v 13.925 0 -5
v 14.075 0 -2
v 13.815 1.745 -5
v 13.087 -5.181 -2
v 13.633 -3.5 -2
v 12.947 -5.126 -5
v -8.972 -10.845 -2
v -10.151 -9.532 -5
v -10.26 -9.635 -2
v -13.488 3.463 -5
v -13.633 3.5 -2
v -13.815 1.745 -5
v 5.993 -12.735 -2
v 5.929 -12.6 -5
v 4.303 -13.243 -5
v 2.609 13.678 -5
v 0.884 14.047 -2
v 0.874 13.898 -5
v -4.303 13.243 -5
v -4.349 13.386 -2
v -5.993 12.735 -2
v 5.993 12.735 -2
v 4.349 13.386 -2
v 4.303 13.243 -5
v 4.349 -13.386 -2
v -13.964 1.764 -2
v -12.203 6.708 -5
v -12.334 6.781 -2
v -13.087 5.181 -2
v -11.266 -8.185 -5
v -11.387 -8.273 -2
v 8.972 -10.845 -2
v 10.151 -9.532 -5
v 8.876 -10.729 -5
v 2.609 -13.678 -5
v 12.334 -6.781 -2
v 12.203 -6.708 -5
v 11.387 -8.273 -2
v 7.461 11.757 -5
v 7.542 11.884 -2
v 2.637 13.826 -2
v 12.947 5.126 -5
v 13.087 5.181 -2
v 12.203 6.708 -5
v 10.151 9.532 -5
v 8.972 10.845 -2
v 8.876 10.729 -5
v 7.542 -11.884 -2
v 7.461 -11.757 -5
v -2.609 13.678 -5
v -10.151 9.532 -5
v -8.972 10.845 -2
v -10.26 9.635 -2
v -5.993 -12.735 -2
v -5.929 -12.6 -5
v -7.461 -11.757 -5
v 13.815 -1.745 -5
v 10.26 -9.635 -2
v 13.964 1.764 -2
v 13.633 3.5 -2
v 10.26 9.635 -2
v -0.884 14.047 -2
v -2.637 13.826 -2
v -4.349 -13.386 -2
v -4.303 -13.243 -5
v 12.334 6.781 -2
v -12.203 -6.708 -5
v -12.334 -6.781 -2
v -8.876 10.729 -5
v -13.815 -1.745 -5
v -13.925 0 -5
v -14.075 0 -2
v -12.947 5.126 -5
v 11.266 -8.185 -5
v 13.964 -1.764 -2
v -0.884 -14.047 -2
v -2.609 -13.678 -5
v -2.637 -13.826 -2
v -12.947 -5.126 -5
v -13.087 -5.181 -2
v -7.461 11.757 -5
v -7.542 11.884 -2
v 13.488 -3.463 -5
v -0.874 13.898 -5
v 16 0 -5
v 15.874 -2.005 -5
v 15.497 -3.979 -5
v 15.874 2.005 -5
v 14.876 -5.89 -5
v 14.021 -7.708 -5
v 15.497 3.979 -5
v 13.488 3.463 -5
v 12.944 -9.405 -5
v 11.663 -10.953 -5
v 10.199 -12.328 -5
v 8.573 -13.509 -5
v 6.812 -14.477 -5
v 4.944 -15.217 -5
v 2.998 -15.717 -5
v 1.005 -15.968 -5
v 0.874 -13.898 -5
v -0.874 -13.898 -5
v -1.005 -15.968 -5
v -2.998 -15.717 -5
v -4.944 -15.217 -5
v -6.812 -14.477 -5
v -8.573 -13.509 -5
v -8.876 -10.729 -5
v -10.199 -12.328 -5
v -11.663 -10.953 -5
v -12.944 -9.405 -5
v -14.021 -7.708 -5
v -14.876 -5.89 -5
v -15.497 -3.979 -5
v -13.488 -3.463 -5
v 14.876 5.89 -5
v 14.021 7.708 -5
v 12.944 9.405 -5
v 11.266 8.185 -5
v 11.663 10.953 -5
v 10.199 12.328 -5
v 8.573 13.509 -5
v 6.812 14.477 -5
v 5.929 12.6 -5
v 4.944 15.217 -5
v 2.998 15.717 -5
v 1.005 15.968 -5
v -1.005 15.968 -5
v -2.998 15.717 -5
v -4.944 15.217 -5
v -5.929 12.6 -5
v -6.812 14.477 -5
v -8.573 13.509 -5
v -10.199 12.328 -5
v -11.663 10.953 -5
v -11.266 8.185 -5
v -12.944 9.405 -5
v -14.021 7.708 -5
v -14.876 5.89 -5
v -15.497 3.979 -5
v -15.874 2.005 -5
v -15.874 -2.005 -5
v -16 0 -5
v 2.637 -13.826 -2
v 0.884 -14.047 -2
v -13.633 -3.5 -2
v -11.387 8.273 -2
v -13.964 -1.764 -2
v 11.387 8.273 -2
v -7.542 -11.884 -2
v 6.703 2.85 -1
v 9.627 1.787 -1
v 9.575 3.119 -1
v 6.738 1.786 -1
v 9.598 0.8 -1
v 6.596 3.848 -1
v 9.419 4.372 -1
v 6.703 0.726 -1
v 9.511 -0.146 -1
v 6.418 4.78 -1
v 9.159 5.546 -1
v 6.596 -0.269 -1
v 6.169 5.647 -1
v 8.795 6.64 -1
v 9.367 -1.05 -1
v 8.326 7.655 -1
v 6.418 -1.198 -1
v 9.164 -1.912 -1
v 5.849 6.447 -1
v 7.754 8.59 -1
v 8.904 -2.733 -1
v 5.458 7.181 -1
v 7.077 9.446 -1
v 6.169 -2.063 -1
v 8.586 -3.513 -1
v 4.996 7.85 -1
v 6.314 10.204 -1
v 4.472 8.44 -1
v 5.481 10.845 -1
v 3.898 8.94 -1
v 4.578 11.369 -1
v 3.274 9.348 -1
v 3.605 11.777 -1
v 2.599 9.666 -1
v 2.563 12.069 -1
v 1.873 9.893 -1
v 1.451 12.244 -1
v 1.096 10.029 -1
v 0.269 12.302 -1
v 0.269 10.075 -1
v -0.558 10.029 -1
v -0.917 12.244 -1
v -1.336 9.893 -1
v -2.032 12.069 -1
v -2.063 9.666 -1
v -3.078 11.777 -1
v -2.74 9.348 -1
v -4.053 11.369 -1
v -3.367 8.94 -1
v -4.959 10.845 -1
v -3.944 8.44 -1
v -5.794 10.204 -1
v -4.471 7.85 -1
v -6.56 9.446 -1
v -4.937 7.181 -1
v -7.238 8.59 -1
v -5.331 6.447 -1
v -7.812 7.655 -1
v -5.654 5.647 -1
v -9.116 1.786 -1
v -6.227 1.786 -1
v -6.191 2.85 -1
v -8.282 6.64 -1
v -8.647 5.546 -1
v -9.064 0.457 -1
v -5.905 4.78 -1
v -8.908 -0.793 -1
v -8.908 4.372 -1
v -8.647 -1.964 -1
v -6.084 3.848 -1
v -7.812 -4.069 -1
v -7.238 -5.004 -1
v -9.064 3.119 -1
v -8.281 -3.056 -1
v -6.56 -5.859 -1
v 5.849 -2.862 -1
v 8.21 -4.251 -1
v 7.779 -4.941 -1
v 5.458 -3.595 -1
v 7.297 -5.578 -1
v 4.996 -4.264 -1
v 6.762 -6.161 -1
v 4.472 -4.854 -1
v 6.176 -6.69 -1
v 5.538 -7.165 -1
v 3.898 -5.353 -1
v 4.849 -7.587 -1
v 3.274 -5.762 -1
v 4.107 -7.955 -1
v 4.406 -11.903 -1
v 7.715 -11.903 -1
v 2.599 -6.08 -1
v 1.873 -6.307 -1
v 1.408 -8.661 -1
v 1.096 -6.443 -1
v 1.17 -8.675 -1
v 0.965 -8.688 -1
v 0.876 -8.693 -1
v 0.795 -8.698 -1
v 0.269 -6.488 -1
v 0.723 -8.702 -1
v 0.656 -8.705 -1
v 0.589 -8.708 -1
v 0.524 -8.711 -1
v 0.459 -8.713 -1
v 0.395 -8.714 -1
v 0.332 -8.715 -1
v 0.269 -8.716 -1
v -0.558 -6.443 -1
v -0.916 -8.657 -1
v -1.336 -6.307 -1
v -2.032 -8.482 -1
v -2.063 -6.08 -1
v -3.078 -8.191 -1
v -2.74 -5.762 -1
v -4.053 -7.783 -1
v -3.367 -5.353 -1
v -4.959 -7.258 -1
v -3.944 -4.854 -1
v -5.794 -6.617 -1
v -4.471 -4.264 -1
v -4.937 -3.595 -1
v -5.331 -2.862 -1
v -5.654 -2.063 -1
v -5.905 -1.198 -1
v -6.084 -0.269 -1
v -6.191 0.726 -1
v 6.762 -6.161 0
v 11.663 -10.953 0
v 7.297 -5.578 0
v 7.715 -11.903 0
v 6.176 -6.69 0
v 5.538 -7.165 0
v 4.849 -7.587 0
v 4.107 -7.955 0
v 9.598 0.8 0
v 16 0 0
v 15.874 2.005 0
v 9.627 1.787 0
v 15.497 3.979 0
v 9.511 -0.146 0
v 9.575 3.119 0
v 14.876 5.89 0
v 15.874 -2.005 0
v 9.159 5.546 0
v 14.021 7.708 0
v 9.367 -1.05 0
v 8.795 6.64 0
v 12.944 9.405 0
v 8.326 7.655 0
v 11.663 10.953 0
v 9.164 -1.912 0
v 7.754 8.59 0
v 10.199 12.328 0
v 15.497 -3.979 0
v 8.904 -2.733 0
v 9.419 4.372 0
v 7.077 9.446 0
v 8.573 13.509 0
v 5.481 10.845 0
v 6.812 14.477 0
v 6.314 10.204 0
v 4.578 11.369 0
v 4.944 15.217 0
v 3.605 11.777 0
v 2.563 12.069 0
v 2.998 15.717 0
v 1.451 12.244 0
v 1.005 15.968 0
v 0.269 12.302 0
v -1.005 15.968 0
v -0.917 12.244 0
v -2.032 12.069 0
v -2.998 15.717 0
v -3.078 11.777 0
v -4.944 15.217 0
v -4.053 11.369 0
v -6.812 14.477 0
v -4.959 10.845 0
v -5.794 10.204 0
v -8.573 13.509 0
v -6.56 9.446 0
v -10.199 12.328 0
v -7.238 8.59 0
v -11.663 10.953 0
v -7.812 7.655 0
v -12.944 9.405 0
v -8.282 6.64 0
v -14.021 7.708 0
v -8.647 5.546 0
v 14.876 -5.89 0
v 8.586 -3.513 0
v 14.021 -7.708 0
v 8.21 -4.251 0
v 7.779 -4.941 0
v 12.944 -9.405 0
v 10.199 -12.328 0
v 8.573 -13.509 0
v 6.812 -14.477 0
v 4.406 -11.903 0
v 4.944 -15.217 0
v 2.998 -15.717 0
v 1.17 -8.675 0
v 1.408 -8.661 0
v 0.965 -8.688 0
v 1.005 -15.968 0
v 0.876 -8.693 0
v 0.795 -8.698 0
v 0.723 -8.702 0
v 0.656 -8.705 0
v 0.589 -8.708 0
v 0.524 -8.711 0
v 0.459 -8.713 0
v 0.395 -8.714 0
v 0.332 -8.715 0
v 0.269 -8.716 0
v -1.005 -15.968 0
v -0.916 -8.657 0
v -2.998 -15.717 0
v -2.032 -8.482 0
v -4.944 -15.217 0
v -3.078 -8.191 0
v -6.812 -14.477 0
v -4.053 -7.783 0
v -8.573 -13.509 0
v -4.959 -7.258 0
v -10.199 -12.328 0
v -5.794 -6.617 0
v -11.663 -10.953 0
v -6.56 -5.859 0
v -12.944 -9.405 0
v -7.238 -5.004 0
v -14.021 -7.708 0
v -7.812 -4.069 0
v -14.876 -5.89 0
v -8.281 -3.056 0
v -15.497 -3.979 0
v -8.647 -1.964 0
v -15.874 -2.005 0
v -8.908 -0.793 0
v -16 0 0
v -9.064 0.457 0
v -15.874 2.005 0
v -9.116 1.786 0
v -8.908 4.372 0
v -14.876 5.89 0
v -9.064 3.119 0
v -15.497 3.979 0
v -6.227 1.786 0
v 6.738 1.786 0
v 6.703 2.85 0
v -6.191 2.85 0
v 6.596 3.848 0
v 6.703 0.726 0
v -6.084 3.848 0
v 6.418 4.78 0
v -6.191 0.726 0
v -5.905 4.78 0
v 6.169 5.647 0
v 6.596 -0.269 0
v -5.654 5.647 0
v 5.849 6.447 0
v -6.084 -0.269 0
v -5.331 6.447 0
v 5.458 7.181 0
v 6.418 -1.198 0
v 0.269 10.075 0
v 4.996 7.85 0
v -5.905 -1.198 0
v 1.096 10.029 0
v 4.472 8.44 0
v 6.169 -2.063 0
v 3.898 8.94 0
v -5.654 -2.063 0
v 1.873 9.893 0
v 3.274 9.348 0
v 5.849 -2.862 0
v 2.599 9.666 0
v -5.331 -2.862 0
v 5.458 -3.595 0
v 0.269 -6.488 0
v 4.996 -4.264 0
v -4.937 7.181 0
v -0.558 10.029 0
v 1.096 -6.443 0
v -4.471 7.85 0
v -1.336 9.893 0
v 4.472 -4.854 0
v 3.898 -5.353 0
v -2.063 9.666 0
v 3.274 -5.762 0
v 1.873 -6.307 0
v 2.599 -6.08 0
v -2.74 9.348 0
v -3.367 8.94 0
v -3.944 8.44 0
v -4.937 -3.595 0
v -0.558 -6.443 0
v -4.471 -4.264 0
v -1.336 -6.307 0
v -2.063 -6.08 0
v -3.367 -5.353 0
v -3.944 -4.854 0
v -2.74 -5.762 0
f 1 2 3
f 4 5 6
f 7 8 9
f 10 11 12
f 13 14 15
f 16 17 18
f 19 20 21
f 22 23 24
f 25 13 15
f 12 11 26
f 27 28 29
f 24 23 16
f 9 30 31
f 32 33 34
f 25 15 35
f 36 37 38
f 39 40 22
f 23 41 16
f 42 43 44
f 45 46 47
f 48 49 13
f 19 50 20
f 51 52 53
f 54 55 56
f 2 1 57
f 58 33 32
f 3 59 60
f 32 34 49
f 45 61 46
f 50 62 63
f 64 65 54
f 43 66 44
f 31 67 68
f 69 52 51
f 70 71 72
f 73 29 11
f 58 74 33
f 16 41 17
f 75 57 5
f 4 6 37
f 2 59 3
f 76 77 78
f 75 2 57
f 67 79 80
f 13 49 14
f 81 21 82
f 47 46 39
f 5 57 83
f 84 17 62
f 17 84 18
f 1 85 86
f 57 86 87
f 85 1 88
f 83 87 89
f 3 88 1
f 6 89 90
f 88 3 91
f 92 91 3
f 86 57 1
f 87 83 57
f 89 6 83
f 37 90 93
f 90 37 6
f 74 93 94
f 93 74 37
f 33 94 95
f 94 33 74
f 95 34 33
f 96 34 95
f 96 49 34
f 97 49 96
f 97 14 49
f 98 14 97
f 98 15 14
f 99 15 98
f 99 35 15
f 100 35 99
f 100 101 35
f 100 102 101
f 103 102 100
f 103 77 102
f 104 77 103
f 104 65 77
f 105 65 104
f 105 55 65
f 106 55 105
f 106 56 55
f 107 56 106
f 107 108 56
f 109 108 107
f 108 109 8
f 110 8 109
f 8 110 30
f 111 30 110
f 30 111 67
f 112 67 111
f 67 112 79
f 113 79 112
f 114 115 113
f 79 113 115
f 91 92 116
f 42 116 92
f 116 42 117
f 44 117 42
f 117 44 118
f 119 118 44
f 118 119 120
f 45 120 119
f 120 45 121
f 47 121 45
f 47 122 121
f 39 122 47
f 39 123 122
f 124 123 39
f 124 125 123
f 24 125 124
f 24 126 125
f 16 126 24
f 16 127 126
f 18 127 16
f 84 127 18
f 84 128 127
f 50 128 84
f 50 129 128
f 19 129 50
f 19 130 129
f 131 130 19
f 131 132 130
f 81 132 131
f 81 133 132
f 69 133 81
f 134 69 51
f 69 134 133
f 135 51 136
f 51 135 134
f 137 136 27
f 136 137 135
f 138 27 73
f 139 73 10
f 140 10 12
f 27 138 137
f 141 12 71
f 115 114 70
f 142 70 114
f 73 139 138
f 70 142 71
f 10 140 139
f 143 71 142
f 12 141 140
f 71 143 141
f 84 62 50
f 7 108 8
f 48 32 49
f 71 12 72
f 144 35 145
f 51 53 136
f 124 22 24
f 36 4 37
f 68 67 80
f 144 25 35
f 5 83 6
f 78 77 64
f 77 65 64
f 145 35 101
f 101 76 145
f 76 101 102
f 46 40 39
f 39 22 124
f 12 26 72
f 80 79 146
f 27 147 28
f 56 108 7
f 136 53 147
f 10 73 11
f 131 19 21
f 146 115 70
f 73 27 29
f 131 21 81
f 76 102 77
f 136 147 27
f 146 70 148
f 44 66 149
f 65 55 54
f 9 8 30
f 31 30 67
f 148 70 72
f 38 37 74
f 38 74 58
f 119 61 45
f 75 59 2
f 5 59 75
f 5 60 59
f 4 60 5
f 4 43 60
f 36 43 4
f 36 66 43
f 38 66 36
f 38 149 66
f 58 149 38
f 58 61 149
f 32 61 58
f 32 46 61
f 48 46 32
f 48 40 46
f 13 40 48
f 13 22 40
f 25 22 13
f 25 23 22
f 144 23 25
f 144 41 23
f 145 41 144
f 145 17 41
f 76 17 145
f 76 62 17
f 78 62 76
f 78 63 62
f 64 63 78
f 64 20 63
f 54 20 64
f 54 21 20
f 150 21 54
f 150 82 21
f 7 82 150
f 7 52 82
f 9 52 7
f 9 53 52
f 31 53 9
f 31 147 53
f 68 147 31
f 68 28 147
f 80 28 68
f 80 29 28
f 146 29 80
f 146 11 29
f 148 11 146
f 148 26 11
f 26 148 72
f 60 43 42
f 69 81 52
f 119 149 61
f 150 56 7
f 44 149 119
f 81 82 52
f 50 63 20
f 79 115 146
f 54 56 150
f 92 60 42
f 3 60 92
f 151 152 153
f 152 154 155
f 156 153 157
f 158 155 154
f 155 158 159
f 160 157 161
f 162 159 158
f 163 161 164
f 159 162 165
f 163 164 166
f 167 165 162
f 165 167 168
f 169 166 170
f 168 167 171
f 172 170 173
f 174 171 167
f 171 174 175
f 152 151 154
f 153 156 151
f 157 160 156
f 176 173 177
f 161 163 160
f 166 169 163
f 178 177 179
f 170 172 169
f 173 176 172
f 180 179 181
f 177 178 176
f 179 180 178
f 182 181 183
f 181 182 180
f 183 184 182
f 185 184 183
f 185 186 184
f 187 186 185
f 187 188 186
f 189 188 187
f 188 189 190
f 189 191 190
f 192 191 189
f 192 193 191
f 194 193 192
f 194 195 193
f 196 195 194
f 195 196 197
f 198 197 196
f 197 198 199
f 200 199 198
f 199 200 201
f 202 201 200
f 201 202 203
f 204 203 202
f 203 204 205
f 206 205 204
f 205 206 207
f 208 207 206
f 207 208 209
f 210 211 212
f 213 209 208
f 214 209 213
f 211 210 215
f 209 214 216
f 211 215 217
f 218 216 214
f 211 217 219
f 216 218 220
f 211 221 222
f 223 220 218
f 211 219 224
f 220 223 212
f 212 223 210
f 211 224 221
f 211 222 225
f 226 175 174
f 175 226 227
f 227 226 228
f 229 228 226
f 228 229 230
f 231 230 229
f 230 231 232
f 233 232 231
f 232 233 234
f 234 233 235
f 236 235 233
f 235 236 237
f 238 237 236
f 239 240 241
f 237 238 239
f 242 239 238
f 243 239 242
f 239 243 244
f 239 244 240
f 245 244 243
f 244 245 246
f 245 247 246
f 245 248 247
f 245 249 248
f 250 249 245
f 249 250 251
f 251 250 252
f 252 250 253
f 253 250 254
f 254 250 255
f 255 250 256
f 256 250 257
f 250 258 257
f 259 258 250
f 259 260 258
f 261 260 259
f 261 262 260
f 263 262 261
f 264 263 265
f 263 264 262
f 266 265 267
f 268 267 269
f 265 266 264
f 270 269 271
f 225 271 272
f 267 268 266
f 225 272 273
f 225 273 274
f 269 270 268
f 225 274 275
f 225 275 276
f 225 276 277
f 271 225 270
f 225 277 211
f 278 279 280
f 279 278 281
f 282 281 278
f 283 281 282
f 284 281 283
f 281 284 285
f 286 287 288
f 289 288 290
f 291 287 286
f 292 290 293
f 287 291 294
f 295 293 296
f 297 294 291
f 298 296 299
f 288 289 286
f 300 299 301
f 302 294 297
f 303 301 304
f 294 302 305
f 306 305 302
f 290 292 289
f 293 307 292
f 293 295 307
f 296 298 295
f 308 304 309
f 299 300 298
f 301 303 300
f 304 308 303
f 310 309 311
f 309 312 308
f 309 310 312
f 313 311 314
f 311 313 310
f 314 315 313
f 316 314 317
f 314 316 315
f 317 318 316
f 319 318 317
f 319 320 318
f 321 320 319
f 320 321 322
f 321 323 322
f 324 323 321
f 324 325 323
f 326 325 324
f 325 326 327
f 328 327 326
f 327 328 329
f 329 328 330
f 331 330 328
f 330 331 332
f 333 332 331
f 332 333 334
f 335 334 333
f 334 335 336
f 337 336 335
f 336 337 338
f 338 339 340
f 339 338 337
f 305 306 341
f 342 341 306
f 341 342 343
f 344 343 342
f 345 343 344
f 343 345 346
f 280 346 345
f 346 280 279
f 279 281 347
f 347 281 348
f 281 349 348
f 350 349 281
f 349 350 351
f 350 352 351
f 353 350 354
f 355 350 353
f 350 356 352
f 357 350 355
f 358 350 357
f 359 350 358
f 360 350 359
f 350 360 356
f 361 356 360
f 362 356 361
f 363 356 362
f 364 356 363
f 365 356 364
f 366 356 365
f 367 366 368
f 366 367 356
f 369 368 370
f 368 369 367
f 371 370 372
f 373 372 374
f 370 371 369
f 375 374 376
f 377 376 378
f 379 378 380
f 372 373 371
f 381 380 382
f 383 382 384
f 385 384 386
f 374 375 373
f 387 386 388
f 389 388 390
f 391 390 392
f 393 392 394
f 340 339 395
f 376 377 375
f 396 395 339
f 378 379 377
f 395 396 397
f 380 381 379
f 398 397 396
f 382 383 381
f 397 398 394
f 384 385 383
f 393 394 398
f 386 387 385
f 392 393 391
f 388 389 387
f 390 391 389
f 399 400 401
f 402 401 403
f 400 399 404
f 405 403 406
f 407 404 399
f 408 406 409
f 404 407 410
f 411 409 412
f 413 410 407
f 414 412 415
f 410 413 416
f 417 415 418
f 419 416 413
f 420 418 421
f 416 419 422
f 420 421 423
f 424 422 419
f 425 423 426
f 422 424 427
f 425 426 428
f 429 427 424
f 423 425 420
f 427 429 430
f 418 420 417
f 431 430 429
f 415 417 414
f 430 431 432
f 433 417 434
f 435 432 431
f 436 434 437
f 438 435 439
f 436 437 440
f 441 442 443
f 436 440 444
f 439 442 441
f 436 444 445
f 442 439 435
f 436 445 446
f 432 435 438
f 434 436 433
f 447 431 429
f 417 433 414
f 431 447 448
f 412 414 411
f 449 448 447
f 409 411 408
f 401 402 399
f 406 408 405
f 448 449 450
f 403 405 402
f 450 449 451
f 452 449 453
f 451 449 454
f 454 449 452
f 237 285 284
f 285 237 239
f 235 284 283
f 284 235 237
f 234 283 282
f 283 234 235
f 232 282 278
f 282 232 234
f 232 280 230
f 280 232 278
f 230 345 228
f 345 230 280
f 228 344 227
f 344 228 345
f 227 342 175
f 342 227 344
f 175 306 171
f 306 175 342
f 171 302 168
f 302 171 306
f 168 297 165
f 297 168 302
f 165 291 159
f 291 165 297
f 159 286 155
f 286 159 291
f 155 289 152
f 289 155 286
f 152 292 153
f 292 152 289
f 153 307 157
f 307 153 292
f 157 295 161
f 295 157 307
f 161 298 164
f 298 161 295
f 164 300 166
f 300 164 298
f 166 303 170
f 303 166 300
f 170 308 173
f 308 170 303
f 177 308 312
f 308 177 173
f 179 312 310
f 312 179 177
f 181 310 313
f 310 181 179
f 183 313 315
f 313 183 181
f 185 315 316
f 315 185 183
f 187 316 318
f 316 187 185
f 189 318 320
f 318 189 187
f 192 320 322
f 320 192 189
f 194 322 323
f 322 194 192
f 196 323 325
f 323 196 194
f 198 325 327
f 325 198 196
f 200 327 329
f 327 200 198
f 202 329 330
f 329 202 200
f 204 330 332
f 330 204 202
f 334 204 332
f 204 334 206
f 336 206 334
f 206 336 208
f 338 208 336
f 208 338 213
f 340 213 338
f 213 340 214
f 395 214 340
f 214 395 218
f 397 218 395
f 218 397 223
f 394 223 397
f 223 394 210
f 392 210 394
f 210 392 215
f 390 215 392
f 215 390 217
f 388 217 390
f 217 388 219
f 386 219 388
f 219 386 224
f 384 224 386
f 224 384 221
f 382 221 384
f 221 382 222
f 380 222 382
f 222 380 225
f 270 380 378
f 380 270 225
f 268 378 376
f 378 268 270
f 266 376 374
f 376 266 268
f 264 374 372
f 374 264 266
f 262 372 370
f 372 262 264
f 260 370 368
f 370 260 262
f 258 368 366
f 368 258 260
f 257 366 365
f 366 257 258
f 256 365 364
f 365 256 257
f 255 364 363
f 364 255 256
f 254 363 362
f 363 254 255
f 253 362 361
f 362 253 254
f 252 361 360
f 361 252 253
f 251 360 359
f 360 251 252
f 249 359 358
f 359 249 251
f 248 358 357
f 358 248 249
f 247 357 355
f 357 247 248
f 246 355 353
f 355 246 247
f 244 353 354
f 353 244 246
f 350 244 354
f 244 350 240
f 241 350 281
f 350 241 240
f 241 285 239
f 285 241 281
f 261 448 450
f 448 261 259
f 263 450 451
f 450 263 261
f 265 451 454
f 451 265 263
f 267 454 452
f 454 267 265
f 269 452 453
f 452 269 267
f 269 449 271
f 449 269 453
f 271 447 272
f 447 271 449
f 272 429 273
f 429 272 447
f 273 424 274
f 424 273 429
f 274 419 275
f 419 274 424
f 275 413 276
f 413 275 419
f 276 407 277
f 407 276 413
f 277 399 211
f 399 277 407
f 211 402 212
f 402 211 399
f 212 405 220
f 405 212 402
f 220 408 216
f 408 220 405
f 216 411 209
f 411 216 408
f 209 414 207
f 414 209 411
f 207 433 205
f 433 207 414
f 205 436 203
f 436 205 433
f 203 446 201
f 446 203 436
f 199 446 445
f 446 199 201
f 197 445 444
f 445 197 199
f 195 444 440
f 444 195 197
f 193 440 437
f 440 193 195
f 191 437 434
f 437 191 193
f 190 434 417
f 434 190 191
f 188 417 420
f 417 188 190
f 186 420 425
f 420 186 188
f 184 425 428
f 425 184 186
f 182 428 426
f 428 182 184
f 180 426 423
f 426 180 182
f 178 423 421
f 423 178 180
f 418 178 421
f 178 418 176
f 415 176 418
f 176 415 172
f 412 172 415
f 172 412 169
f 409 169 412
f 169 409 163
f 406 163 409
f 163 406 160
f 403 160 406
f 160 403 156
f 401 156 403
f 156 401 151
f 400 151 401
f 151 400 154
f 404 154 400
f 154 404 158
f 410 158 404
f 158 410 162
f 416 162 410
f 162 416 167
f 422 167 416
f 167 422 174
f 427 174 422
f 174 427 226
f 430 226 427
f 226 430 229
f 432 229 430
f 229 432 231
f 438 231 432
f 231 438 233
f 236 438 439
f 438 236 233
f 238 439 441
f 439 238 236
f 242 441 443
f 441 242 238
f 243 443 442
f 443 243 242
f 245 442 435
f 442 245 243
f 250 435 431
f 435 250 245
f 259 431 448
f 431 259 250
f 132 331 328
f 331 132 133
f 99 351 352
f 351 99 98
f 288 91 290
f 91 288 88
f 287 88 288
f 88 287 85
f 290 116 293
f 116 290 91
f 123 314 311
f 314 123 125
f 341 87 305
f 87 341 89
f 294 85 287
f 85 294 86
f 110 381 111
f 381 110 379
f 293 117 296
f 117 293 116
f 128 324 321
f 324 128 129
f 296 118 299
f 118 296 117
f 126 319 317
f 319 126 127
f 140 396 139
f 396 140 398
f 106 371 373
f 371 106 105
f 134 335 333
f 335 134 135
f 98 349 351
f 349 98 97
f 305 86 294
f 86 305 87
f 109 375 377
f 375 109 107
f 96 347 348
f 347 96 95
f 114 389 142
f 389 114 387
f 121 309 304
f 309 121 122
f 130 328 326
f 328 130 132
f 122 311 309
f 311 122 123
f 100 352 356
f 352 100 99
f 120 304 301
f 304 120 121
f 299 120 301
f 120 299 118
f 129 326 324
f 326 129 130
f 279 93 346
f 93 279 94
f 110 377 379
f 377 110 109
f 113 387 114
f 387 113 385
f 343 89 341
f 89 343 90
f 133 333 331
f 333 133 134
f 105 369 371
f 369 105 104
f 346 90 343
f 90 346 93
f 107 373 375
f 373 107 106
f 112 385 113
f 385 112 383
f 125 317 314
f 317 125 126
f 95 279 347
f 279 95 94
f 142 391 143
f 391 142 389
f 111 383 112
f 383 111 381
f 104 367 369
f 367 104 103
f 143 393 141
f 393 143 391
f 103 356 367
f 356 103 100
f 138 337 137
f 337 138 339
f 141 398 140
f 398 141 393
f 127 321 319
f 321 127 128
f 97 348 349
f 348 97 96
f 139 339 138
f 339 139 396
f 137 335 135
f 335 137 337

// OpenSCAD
$fn = 50;


difference() {
	union() {
		translate(v = [0, 0, -5.0000000000]) {
			cylinder(h = 5, r = 16.0000000000);
		}
	}
	union() {
		#translate(v = [0, 0, -5.0000000000]) {
			cylinder(h = 3, r1 = 13.9250000000, r2 = 14.0750000000);
		}
		translate(v = [0, 0, -1]) {
			linear_extrude(height = 1) {
				text(font = "Impact", halign = "center", size = 20, text = "Q", valign = "center");
			}
		}
	}
}
